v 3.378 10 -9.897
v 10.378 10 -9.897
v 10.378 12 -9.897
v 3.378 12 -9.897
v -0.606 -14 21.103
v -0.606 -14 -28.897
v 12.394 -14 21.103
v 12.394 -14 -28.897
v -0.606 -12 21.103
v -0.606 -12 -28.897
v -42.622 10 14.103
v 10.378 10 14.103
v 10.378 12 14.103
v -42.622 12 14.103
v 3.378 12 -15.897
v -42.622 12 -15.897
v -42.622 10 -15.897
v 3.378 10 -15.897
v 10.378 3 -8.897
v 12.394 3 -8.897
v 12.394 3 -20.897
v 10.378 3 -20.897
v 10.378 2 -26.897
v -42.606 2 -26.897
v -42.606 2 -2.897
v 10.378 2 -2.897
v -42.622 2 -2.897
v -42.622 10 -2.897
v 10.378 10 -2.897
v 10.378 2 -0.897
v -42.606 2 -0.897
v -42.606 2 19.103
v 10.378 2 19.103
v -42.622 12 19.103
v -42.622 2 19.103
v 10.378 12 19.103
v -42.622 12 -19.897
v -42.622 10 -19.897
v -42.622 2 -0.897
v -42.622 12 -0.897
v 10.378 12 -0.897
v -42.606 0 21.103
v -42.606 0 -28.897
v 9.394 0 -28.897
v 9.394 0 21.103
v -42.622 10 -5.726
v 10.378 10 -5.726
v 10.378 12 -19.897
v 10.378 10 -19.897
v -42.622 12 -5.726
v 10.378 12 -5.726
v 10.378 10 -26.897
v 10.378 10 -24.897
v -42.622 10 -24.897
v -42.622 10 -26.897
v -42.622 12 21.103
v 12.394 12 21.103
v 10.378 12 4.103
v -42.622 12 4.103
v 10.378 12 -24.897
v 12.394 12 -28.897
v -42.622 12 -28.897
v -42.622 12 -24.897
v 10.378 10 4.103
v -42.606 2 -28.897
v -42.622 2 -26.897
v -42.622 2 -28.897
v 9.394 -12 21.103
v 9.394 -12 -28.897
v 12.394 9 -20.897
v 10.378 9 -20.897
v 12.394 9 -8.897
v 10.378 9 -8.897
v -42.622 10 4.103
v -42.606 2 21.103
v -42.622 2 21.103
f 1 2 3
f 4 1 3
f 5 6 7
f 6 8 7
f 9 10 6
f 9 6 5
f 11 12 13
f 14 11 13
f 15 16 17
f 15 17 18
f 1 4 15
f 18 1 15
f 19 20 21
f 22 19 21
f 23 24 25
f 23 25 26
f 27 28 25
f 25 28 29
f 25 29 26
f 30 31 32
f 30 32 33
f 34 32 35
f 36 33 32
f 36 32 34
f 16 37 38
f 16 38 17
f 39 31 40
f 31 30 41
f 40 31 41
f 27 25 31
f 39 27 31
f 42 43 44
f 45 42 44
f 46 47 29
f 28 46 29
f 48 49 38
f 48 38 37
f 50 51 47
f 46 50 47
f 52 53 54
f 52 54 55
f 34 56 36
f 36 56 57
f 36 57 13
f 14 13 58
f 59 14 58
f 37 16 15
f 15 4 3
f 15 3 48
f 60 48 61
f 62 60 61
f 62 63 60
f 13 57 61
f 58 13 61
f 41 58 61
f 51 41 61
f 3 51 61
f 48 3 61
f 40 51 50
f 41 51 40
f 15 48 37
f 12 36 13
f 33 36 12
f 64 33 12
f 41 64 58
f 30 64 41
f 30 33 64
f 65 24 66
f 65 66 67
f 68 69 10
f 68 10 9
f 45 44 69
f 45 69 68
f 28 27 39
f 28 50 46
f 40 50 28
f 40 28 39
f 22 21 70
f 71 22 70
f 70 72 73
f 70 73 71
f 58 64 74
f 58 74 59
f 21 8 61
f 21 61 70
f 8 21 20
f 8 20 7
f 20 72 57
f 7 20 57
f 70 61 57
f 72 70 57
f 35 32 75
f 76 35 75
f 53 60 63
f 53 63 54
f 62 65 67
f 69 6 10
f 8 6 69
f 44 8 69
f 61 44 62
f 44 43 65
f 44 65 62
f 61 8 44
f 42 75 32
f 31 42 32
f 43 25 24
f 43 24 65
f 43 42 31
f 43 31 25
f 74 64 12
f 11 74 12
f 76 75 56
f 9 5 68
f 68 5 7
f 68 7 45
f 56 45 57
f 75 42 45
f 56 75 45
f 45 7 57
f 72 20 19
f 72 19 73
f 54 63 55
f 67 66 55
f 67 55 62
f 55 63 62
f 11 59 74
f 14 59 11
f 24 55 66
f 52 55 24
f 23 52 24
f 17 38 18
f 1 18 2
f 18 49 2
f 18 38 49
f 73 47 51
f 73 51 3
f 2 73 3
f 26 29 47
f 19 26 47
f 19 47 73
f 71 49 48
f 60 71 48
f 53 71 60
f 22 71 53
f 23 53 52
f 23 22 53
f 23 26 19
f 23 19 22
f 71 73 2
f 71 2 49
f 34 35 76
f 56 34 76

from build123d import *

# Parameters (mm, degrees)
SKETCH_1_W          = 55
SKETCH_1_H          = 50
EXTRUDE_1_DEPTH     = 2
SKETCH_2_W          = 2.016430074
SKETCH_2_H          = 50
EXTRUDE_2_DEPTH     = 10
SKETCH_4_W          = 10
SKETCH_4_H          = 2
SKETCH_4_W_2        = 2
SKETCH_4_H_2        = 10
EXTRUDE_3_DEPTH     = 53
SKETCH_5_W          = 12
SKETCH_5_H          = 6
CUT_EXTRUDE_1_DEPTH = 40
SKETCH_6_W          = 46
SKETCH_6_H          = 6
CUT_EXTRUDE_3_DEPTH = 2
SKETCH_7_W          = 3
SKETCH_7_H          = 50
EXTRUDE_4_DEPTH     = 14
SKETCH_8_W          = 50
SKETCH_8_H          = 2
EXTRUDE_5_DEPTH     = 10


with BuildPart() as part:
    # 草图1 → 凸台-拉伸1 (new body)
    with BuildSketch(Plane(origin=(0, 0, 0), x_dir=(1, 0, 0), z_dir=(0, 1, 0))):
        with Locations((-15.105645182, 3.897173973)):
            Rectangle(SKETCH_1_W, SKETCH_1_H)
    extrude(amount=EXTRUDE_1_DEPTH)

    # 草图2 → 凸台-拉伸2 (add)
    with BuildSketch(Plane(origin=(0, 2, 0), x_dir=(1, 0, 0), z_dir=(0, 1, 0))):
        with Locations((11.386139781, 3.897173973)):
            Rectangle(SKETCH_2_W, SKETCH_2_H)
    extrude(amount=EXTRUDE_2_DEPTH)

    # 草图4 → 凸台-拉伸3 (add)
    with BuildSketch(Plane.ZY.offset(-10.377924744)):
        with Locations((-14.897173973, 11)):
            Rectangle(SKETCH_4_W, SKETCH_4_H)
        Polygon((-28.897173973, 12), (-26.897173973, 12), (-24.897173973, 12), (-24.897173973, 10), (-26.897173973, 10), (-26.897173973, 2), (-28.897173973, 2), align=None)
        Polygon((-2.897173973, 10), (-2.897173973, 2), (-0.897173973, 2), (-0.897173973, 12), (-2.897173973, 12), (-5.725601098, 12), (-5.725601098, 10), align=None)
        with Locations((9.102826027, 11)):
            Rectangle(SKETCH_4_W, SKETCH_4_H)
        with Locations((20.102826027, 7)):
            Rectangle(SKETCH_4_W_2, SKETCH_4_H_2)
    extrude(amount=EXTRUDE_3_DEPTH)

    # 草图5 → 切除-拉伸1 (cut)
    with BuildSketch(Plane(origin=(12.394354818, 0, 0), x_dir=(0, 0, -1), z_dir=(1, 0, 0))):
        with Locations((14.897173973, 6)):
            Rectangle(SKETCH_5_W, SKETCH_5_H)
    extrude(amount=-CUT_EXTRUDE_1_DEPTH, mode=Mode.SUBTRACT)

    # 草图6 → 切除-拉伸3 (cut)
    with BuildSketch(Plane(origin=(0, 12, 0), x_dir=(1, 0, 0), z_dir=(0, 1, 0))):
        with Locations((-19.622075256, 12.897173973)):
            Rectangle(SKETCH_6_W, SKETCH_6_H)
    extrude(amount=-CUT_EXTRUDE_3_DEPTH, mode=Mode.SUBTRACT)

    # 草图7 → 凸台-拉伸4 (add)
    with BuildSketch(Plane.XZ):
        with Locations((10.894354818, -3.897173973)):
            Rectangle(SKETCH_7_W, SKETCH_7_H)
    extrude(amount=EXTRUDE_4_DEPTH)

    # 草图8 → 凸台-拉伸5 (add)
    with BuildSketch(Plane.ZY.offset(-9.394354818)):
        with Locations((-3.897173973, -13)):
            Rectangle(SKETCH_8_W, SKETCH_8_H)
    extrude(amount=EXTRUDE_5_DEPTH)


solid = part.part
